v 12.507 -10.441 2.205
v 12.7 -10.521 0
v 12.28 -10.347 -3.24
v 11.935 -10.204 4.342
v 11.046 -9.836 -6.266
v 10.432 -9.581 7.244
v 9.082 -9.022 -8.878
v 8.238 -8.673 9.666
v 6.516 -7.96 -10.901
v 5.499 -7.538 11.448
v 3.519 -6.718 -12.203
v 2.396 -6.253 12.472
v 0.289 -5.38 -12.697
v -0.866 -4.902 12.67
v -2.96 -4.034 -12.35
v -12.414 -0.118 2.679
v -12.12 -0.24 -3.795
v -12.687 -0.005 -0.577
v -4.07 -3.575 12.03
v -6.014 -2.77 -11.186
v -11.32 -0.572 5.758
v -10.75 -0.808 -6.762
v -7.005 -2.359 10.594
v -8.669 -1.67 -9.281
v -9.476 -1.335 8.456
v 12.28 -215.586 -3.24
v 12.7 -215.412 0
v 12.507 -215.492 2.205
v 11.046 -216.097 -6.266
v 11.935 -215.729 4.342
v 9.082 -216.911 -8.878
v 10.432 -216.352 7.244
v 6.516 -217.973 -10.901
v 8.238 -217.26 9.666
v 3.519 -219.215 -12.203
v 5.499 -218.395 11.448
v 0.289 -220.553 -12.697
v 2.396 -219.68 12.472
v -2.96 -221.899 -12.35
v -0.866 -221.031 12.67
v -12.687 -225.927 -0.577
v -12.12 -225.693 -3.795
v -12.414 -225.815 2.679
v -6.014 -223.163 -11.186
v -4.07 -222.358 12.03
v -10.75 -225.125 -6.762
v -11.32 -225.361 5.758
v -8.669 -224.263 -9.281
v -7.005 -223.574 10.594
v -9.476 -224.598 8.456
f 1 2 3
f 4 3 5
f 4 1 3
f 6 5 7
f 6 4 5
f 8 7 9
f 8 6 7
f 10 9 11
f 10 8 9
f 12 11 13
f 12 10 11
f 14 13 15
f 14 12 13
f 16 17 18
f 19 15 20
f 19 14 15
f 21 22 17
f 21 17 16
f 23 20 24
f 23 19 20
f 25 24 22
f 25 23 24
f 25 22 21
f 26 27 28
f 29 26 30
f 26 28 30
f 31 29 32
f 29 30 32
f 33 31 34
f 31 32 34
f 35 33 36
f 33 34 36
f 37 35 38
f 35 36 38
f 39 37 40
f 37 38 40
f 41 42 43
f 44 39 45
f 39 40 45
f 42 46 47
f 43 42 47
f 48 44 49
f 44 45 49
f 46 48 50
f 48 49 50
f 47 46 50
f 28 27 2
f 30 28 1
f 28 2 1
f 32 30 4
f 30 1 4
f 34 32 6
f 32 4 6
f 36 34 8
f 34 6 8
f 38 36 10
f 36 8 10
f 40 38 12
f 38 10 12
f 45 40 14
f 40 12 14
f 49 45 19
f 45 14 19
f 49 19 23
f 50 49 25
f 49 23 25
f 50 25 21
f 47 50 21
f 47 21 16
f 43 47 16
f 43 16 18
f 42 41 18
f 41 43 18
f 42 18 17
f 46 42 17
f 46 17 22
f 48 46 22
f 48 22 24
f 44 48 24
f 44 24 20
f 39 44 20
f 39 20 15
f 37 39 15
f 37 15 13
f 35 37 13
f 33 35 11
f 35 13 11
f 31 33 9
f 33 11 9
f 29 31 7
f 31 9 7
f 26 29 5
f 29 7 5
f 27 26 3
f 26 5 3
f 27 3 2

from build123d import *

# Parameters (mm, degrees)
F1_R      = 12.7
F2_DEPTH  = 225.933
F6_W      = 114.097729
F6_H      = 88.5094
F7_DEPTH  = 25.4
F11_W     = 145.65833
F11_H     = 82.475946
F12_DEPTH = 25.4


with BuildPart() as f2:
    # F1 (on face) → F2 (new body)
    with BuildSketch(Plane.XZ):
        Circle(F1_R)
    extrude(amount=F2_DEPTH)

    # F6 (on face) → F7 (cut)
    with BuildSketch(Plane(origin=(78.019506, -188.35575, 0), x_dir=(-0.92388, -0.382683, 0), z_dir=(-0.382683, 0.92388, 0))):
        with Locations((118.185877, 2.949333)):
            Rectangle(F6_W, F6_H)
    extrude(amount=-F7_DEPTH, mode=Mode.SUBTRACT)

    # F11 (on face) → F12 (cut)
    with BuildSketch(Plane(origin=(-1.859872, -4.490128, 0), x_dir=(-0.92388, 0.382683, 0), z_dir=(0.382683, 0.92388, 0))):
        Rectangle(F11_W, F11_H)
    extrude(amount=F12_DEPTH, mode=Mode.SUBTRACT)


solid = f2.part
